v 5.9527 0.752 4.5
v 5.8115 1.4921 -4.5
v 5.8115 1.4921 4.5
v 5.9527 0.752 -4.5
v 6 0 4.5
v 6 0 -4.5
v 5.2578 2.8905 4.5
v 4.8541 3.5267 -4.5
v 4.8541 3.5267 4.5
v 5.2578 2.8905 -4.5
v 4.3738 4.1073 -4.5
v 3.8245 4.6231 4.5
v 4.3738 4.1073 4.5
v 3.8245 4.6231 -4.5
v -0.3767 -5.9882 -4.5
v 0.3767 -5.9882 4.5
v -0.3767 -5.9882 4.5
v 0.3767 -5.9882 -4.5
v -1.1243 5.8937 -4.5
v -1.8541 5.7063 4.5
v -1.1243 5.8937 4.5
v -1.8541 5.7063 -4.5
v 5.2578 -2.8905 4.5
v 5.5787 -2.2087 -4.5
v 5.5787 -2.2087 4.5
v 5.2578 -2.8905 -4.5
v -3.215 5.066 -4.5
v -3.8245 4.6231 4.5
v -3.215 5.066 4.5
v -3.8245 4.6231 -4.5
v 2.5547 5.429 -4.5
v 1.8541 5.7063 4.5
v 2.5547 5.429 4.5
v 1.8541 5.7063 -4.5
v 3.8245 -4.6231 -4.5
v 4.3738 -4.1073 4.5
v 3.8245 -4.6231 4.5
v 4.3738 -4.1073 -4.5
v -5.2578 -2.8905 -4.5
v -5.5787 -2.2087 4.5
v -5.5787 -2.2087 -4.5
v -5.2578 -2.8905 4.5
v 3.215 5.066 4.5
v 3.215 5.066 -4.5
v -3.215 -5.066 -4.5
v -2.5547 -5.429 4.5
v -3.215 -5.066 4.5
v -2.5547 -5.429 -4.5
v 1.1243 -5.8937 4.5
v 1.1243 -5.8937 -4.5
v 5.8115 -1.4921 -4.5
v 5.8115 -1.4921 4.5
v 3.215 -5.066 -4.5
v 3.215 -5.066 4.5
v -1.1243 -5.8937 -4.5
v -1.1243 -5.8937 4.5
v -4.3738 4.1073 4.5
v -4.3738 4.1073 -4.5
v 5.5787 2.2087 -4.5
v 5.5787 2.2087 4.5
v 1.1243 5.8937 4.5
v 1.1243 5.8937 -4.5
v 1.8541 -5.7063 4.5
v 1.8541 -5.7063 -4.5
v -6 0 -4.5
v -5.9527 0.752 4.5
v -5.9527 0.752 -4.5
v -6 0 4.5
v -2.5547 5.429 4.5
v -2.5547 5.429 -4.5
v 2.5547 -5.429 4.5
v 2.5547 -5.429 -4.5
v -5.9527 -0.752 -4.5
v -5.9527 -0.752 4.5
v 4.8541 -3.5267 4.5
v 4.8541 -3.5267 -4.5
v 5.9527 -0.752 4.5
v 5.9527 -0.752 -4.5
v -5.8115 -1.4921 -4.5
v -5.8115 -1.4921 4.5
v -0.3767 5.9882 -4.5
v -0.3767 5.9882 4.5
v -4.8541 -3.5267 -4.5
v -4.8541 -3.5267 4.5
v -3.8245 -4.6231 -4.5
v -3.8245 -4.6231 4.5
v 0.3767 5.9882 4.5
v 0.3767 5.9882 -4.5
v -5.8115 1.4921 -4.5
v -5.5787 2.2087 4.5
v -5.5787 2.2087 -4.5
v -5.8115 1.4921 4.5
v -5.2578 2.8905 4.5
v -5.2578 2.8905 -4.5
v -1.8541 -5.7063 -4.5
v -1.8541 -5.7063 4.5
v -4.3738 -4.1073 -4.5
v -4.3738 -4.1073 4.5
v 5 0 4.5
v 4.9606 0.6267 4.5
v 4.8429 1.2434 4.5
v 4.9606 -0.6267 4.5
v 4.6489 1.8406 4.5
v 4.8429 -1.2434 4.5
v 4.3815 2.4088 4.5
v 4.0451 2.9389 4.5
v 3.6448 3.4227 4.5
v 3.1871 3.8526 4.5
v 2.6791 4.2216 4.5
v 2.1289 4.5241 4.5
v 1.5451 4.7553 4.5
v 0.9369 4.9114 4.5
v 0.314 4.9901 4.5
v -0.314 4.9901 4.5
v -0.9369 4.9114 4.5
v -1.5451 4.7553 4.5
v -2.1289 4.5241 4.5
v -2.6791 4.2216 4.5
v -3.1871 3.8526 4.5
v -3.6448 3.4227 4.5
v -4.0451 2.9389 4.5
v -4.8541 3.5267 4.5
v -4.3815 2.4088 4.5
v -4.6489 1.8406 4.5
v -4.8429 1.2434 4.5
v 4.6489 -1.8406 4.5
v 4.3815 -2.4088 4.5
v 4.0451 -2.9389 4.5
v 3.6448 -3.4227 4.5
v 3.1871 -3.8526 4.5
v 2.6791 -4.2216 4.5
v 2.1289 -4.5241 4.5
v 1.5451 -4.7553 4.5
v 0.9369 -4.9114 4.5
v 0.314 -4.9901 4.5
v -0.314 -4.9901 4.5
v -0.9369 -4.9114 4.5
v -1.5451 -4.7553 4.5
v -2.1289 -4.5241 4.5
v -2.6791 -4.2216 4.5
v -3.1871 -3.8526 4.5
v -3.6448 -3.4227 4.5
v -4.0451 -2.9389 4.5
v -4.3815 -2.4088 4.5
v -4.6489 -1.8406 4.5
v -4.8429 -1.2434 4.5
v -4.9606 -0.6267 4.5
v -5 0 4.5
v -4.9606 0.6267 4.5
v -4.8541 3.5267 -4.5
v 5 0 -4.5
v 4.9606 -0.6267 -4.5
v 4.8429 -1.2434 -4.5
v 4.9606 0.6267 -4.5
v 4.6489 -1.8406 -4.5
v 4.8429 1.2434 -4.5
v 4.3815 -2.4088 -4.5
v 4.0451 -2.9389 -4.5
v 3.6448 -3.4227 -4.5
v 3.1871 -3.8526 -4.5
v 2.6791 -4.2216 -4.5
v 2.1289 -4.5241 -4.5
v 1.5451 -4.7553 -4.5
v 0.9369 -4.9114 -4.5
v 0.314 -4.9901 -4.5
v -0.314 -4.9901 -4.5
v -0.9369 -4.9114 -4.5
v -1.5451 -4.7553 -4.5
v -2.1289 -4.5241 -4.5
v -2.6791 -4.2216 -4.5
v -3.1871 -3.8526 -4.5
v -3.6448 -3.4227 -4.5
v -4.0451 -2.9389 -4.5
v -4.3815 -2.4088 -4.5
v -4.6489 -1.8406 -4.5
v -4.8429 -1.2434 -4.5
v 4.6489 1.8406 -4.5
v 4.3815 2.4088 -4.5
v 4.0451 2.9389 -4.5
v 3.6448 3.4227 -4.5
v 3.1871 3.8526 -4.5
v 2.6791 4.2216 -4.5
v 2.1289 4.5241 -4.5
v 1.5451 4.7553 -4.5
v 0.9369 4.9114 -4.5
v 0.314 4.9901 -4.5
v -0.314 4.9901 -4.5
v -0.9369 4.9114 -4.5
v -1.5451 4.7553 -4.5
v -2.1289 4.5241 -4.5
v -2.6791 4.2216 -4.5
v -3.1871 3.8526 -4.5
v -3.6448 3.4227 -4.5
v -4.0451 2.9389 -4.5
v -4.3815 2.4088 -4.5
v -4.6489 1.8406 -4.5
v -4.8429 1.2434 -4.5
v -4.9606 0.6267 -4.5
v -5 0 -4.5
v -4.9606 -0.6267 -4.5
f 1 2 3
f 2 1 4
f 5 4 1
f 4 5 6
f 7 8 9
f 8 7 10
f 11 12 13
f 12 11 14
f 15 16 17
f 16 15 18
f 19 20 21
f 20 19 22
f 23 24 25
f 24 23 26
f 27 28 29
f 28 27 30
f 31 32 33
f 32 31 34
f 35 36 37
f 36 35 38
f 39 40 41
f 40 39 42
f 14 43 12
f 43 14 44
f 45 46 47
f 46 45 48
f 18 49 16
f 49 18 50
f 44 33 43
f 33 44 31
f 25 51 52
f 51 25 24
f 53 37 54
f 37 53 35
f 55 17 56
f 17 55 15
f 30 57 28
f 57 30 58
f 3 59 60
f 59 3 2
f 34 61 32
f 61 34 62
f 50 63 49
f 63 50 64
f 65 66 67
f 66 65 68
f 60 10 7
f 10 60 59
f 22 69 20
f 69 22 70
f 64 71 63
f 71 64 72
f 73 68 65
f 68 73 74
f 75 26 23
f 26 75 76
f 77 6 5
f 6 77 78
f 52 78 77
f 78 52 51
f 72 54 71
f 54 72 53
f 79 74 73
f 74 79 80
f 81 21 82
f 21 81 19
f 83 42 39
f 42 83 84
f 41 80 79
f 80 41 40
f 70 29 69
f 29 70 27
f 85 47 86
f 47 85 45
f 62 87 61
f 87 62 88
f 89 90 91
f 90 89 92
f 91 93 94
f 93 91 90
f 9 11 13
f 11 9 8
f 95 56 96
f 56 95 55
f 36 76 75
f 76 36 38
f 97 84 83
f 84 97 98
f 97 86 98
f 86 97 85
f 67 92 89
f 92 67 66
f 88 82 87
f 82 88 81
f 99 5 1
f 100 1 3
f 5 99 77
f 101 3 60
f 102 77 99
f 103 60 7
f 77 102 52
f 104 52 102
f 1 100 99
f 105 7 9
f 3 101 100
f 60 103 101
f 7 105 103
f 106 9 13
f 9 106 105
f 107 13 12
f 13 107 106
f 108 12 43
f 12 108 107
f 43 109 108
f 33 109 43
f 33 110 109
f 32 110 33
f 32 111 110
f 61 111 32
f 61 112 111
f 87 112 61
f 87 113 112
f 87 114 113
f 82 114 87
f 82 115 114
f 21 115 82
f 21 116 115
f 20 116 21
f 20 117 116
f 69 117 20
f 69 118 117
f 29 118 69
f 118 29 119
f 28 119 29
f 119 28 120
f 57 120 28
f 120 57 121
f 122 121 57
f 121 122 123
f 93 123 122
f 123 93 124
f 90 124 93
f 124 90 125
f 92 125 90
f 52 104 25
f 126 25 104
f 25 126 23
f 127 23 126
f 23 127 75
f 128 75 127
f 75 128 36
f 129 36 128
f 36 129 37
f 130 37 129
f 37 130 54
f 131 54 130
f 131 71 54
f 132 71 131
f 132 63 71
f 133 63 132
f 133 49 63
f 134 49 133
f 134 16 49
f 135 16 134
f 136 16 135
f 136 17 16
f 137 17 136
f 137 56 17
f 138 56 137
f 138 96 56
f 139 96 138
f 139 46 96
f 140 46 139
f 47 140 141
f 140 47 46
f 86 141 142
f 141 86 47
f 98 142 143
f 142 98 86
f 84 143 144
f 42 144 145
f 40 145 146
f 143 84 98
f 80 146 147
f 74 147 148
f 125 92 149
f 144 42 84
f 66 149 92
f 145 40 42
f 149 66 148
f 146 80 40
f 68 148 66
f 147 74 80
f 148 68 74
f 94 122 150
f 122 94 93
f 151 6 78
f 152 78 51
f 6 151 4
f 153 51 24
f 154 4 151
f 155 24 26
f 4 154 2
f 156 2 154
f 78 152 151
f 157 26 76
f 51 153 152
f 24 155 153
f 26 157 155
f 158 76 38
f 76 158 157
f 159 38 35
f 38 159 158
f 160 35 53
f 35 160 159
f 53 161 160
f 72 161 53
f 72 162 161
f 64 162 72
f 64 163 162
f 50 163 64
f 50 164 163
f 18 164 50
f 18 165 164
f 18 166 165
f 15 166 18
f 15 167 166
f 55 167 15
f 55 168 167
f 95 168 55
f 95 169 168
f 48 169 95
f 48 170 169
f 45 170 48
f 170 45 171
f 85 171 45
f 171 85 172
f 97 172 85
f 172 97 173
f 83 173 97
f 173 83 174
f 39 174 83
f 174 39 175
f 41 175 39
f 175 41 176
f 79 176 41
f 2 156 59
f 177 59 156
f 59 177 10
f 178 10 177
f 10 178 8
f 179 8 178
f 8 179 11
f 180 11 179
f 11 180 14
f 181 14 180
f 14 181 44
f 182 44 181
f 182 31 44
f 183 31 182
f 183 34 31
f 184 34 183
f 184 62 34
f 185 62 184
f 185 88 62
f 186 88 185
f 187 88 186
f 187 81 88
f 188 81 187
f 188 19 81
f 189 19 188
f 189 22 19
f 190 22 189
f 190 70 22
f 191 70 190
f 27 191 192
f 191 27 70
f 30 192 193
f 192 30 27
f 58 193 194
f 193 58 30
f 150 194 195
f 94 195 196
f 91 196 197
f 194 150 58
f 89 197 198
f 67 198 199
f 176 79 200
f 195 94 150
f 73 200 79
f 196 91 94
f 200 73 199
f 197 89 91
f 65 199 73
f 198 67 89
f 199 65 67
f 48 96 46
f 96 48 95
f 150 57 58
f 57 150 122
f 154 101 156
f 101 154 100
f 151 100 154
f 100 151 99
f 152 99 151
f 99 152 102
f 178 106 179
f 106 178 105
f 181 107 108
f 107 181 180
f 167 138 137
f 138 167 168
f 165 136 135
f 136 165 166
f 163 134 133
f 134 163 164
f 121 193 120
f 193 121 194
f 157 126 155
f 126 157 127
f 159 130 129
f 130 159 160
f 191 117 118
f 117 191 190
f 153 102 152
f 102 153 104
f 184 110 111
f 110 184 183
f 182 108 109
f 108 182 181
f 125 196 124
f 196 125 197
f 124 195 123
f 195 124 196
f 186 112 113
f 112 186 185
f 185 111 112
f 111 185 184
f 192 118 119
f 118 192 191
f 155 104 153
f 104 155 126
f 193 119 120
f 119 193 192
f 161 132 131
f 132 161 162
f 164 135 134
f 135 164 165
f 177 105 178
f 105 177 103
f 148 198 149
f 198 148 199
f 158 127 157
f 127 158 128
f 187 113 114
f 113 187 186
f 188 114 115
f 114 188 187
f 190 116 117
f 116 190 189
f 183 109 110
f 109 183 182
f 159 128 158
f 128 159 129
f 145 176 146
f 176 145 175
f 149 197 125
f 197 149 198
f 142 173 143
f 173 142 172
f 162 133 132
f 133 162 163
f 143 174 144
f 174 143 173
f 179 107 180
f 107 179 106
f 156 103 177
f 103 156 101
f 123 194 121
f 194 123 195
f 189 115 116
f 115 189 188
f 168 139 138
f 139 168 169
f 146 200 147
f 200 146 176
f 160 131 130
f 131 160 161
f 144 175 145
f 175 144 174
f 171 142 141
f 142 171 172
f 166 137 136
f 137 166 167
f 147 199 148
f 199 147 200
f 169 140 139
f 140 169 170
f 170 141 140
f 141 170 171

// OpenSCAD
$fn = 50;


difference() {
	union() {
		translate(v = [0, 0, -4.5000000000]) {
			cylinder(h = 9, r = 6.0000000000);
		}
	}
	union() {
		translate(v = [0, 0, -100.0000000000]) {
			cylinder(h = 200, r = 5.0000000000);
		}
	}
}
